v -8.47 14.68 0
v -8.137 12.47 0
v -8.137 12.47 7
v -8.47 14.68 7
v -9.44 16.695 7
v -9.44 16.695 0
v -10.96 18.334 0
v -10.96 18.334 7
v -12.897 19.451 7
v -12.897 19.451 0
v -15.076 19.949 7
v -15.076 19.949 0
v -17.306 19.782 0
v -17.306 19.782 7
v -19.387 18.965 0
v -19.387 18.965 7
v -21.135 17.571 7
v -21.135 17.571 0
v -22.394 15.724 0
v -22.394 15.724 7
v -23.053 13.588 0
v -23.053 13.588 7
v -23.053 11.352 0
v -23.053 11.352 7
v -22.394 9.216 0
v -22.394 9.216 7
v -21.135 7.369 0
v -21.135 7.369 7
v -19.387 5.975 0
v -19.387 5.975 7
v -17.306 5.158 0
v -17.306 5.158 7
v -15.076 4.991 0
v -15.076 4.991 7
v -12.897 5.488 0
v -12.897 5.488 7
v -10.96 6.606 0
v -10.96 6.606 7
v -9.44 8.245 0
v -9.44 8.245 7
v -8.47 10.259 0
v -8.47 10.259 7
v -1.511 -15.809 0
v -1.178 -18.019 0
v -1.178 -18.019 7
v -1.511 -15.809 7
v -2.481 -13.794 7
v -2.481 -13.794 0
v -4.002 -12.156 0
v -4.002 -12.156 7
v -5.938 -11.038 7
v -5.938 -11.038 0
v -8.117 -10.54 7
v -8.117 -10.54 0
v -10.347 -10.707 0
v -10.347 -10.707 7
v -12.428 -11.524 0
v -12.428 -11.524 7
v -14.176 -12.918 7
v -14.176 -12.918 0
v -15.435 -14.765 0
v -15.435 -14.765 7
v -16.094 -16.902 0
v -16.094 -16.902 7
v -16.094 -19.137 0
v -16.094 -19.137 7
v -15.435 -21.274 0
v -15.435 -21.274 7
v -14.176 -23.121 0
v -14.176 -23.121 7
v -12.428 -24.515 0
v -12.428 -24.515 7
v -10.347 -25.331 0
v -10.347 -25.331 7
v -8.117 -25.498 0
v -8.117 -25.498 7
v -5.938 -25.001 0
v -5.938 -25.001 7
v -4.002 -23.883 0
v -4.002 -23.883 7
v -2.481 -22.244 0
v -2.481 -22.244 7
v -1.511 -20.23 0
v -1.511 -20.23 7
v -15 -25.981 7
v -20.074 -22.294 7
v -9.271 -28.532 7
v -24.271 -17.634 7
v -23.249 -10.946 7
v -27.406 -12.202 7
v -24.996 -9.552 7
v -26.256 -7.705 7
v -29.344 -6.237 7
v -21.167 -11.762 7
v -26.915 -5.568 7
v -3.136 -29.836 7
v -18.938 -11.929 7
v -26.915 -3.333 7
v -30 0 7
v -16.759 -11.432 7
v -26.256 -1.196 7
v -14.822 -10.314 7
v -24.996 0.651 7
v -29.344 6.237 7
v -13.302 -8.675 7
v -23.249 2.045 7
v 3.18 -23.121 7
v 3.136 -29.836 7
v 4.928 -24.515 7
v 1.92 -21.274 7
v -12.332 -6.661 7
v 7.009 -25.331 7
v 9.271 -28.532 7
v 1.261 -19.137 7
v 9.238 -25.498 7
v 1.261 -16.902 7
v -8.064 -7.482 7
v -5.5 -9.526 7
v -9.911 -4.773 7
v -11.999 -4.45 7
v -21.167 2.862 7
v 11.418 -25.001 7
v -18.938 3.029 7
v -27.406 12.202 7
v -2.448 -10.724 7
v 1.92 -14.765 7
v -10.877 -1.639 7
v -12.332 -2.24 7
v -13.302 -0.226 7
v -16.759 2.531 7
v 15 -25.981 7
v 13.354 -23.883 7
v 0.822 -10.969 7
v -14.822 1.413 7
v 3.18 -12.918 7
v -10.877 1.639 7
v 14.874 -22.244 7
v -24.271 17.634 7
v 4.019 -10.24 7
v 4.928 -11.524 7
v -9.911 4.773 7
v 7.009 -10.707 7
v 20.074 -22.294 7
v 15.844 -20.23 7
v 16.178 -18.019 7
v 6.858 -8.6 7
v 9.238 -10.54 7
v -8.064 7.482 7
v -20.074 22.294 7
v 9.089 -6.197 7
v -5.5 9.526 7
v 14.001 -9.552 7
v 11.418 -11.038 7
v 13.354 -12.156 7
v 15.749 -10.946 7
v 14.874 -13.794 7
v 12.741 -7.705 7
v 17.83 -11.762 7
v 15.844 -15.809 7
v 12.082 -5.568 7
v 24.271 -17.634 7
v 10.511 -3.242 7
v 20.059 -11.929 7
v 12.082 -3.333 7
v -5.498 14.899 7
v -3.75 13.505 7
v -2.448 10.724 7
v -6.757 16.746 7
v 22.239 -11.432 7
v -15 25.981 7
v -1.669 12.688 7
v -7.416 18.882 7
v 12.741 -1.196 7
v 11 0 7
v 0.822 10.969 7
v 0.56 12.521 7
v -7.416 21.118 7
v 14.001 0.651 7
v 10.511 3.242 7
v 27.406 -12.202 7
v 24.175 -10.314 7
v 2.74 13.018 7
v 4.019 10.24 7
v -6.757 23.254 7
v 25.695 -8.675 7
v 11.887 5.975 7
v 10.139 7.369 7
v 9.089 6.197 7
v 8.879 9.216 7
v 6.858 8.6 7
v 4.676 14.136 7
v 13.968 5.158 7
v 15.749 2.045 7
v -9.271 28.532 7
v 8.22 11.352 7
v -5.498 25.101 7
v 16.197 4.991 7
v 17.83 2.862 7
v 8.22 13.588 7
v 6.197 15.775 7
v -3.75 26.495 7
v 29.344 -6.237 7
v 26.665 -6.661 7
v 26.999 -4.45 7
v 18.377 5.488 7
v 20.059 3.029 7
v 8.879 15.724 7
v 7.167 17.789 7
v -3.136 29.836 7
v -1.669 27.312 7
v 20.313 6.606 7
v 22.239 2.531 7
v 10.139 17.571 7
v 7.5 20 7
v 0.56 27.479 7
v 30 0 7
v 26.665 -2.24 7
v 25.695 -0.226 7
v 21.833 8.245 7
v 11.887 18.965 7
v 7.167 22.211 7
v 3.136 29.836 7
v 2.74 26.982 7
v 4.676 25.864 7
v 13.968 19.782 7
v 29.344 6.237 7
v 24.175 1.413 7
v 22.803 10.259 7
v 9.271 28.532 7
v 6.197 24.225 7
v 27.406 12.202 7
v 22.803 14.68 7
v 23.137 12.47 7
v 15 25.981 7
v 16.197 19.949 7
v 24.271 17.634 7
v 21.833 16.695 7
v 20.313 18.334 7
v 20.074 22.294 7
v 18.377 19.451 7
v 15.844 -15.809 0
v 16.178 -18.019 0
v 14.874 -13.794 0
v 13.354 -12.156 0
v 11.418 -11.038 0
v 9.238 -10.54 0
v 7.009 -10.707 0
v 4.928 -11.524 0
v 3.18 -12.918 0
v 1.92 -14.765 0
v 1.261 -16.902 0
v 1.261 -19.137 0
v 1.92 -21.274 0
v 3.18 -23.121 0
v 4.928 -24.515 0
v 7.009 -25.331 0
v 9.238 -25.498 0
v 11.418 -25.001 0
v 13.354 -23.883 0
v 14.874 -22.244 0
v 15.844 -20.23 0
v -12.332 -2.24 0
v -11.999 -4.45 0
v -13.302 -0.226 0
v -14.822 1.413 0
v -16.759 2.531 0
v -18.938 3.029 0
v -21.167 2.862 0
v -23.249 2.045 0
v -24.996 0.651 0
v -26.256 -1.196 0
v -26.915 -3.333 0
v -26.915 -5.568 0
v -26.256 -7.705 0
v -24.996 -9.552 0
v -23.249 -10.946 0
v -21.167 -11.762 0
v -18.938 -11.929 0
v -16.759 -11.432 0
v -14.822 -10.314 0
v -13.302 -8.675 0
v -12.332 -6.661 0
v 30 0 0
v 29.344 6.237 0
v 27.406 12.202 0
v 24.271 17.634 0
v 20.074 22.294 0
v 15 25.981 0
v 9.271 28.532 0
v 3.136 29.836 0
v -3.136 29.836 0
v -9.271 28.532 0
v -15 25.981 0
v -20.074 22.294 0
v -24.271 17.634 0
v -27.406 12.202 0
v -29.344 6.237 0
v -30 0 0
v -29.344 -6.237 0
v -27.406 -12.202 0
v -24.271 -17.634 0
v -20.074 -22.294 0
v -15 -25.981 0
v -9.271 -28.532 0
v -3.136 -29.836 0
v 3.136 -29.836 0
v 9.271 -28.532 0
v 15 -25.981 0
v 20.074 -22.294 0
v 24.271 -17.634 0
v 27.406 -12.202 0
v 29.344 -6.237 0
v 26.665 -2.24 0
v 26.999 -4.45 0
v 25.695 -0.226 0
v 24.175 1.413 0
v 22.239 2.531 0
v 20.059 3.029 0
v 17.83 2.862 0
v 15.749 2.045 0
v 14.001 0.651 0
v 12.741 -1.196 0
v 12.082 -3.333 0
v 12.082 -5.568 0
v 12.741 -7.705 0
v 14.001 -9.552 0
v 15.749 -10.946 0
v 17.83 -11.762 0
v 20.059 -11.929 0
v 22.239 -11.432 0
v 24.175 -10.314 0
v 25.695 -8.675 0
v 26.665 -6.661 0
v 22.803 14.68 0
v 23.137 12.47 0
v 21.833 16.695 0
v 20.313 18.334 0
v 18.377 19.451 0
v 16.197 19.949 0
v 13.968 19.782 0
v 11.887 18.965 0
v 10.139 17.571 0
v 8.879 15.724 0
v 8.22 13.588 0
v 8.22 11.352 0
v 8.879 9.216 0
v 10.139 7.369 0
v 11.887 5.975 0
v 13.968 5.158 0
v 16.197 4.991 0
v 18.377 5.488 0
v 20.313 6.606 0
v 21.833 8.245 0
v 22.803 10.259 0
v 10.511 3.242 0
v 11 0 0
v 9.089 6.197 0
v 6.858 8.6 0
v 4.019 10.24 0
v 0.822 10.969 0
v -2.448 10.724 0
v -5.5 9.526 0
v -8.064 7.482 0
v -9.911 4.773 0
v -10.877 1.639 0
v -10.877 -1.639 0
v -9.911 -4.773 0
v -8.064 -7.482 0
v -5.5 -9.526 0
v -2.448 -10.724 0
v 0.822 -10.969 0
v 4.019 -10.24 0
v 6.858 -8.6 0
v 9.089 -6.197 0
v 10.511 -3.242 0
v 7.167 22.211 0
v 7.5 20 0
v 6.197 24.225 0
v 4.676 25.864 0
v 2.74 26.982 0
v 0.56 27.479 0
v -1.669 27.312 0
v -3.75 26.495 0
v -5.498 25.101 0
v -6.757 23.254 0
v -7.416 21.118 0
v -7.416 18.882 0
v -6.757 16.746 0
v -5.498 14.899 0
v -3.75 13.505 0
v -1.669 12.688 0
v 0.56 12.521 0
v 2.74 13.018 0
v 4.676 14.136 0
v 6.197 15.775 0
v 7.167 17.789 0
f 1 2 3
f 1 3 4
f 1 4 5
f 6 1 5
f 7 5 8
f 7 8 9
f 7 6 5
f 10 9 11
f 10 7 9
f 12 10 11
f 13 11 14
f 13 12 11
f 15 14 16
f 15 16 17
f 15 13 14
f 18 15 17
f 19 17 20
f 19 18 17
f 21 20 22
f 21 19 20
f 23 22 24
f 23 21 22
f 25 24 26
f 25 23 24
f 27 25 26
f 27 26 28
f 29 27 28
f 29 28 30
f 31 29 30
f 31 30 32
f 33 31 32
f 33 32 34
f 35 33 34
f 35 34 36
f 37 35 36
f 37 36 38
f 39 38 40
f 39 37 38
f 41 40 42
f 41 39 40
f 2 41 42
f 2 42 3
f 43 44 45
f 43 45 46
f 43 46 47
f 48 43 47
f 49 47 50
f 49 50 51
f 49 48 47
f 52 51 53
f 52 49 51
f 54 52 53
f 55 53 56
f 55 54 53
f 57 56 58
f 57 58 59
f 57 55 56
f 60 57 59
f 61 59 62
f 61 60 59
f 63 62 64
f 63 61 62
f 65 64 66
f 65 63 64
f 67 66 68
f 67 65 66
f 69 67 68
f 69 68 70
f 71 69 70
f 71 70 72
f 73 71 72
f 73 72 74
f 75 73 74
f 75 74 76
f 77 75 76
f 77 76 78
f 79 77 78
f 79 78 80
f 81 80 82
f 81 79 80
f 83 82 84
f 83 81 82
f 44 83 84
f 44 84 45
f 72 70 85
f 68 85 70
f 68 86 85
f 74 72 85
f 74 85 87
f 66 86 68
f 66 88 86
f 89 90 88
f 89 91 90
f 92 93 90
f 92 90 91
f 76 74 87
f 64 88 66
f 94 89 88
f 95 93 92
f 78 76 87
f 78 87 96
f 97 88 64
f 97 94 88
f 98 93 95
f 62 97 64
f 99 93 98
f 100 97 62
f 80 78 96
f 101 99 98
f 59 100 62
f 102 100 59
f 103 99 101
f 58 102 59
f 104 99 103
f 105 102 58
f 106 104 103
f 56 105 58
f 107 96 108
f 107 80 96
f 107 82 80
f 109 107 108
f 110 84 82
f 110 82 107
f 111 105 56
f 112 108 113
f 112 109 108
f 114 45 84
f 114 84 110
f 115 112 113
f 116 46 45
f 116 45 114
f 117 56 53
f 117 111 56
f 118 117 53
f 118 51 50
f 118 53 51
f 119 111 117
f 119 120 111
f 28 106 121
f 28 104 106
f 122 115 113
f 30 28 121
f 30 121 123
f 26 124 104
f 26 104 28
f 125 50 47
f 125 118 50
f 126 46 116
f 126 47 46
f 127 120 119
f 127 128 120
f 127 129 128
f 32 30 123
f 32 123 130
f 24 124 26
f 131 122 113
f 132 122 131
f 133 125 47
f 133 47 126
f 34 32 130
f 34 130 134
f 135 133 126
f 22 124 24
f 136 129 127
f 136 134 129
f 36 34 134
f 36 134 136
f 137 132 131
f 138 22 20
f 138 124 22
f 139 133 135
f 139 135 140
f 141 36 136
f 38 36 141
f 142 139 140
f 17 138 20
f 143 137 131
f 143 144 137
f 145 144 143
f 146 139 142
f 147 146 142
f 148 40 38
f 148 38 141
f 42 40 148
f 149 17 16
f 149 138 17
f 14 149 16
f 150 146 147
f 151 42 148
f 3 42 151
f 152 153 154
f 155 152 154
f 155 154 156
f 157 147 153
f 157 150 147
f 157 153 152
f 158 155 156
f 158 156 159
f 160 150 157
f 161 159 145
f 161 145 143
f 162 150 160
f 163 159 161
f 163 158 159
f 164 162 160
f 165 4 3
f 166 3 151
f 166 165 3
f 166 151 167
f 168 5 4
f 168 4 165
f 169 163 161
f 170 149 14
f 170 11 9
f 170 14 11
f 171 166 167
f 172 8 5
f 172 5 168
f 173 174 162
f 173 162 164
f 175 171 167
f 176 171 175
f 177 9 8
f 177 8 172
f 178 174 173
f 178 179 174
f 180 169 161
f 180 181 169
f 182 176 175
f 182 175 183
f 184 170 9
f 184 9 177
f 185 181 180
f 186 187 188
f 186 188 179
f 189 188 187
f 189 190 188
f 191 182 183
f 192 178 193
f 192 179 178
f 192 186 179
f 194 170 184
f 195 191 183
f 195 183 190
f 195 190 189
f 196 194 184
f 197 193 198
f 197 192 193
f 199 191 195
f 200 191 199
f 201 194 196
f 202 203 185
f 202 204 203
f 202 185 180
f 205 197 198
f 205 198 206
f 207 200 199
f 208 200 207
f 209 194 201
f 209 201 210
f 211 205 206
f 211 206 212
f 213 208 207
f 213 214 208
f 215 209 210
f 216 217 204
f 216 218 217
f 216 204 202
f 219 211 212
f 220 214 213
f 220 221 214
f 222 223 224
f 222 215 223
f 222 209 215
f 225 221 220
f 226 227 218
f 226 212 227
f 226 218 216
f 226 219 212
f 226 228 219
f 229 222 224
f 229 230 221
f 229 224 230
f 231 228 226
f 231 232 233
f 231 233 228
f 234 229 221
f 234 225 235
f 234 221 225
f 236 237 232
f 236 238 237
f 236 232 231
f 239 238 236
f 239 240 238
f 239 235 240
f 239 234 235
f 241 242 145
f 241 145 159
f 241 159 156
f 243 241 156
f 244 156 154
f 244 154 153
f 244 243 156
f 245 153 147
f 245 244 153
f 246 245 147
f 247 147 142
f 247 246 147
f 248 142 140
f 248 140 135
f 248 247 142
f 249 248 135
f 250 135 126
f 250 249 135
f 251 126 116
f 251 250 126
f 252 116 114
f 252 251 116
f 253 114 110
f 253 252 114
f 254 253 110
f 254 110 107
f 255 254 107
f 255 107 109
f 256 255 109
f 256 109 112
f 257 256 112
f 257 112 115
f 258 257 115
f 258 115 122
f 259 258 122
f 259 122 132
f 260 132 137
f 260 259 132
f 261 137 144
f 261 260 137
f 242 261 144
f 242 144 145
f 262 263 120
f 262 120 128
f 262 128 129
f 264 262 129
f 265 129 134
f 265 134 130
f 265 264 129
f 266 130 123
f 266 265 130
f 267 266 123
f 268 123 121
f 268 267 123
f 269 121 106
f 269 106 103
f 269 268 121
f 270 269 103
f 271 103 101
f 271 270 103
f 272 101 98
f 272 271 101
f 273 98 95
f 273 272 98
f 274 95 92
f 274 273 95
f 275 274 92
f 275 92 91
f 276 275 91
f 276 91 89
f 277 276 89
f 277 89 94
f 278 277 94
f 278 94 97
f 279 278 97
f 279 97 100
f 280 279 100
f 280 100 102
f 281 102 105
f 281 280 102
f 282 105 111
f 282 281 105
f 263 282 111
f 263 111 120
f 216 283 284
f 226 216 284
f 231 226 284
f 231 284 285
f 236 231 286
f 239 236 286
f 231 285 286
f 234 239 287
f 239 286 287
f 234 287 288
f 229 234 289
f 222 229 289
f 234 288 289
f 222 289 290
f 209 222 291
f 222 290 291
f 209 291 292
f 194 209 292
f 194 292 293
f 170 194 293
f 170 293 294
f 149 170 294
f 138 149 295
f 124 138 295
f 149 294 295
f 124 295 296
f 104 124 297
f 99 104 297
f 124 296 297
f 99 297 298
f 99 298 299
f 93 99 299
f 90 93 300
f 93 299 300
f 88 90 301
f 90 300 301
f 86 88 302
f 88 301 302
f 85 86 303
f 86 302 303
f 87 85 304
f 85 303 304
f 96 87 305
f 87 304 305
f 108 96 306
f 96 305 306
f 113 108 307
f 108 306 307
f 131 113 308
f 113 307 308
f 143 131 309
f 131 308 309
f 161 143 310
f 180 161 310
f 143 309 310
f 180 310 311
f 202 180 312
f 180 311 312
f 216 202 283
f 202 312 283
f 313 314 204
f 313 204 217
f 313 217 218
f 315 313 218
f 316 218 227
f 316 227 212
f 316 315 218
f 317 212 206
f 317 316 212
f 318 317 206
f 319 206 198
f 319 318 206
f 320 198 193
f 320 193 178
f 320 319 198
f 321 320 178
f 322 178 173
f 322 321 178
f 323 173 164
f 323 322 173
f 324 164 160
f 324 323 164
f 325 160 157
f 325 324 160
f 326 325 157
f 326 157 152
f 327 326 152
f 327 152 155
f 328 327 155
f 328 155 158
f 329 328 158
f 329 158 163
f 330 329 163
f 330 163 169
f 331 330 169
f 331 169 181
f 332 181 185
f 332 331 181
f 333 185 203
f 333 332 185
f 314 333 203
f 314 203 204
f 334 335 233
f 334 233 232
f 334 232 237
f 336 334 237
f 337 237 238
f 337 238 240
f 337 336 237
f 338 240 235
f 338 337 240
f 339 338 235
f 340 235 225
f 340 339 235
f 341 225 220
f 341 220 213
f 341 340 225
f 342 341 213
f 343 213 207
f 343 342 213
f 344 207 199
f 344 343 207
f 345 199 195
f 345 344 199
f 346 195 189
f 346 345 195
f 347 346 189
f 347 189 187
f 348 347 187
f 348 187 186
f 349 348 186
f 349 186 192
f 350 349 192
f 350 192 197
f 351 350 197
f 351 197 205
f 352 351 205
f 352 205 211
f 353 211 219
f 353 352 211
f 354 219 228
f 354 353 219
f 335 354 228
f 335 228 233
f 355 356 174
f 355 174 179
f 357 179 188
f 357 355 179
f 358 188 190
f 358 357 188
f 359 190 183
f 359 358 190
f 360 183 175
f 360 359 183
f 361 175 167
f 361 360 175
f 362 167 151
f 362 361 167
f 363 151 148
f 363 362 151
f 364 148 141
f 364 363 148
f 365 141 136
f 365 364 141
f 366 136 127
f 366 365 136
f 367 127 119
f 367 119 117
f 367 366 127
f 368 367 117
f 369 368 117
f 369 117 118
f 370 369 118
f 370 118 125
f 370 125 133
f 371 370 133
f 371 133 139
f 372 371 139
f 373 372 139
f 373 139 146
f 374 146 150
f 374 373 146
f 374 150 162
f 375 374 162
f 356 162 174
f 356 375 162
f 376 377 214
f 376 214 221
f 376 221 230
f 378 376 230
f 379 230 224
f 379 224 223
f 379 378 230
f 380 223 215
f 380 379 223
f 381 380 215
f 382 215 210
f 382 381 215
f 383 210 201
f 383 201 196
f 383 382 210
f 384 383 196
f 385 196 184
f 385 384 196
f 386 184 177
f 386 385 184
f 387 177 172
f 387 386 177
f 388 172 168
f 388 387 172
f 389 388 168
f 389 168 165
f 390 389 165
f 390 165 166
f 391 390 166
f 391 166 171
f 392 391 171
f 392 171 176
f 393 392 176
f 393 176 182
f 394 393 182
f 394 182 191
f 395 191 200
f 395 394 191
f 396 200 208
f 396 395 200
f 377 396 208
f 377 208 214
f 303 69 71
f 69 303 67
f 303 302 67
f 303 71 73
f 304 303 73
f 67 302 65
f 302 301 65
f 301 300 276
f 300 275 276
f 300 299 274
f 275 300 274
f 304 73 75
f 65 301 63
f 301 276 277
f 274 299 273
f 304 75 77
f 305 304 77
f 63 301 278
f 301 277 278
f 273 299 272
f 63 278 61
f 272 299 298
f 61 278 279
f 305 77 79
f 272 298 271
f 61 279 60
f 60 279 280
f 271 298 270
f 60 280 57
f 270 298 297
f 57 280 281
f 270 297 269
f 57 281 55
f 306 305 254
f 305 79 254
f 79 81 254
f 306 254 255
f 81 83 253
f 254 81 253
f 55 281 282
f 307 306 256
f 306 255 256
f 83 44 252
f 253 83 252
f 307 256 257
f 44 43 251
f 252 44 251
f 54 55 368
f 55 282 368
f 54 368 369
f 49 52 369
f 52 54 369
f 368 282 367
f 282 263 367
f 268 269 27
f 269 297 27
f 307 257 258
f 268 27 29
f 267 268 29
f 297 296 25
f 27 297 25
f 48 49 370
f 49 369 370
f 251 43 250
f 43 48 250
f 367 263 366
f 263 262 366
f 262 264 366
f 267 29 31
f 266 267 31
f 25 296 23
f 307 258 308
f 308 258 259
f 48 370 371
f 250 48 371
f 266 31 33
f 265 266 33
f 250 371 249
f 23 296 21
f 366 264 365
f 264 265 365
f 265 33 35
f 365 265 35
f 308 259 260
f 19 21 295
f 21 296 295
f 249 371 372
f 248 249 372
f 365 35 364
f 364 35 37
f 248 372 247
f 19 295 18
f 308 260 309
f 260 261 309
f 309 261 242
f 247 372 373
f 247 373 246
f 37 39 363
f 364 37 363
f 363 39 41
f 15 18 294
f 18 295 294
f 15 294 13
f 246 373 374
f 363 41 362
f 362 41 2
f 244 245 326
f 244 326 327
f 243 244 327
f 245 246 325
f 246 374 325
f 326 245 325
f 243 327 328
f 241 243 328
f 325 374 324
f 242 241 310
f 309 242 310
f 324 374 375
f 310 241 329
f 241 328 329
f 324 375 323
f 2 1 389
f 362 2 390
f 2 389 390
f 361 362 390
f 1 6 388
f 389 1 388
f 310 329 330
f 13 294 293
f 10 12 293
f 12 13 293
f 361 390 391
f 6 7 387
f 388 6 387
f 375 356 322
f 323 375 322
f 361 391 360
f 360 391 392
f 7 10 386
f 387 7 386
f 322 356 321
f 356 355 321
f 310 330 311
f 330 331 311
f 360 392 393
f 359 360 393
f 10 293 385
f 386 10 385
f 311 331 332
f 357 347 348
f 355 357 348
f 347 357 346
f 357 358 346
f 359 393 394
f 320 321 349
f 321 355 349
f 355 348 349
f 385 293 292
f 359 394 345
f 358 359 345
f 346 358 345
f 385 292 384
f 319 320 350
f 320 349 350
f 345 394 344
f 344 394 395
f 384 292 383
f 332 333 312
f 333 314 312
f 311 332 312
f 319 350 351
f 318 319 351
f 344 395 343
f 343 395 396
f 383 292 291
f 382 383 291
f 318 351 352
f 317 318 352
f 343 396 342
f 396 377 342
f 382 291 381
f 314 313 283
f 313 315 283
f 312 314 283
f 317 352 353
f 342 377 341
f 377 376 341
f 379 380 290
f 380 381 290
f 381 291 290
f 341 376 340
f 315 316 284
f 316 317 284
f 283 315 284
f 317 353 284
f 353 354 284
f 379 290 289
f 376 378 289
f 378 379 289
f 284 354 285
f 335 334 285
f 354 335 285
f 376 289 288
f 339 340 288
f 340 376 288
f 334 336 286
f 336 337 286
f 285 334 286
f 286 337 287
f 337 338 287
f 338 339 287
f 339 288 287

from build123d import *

# Parameters (mm, degrees)
F0_R     = 30
F0_R_2   = 7.5
F0_R_3   = 11
F1_DEPTH = 7


with BuildPart() as f1:
    # F0 (on Top) → F1 (new body)
    with BuildSketch(Plane.XY):
        Circle(F0_R)
        with Locations((-8.677675, -18.019377)):
            Circle(F0_R_2, mode=Mode.SUBTRACT)
        with Locations((-19.498558, -4.450419)):
            Circle(F0_R_2, mode=Mode.SUBTRACT)
        with Locations((8.677675, -18.019377)):
            Circle(F0_R_2, mode=Mode.SUBTRACT)
        with Locations((19.498558, -4.450419)):
            Circle(F0_R_2, mode=Mode.SUBTRACT)
        with Locations((-15.63663, 12.469796)):
            Circle(F0_R_2, mode=Mode.SUBTRACT)
        Circle(F0_R_3, mode=Mode.SUBTRACT)
        with Locations((15.63663, 12.469796)):
            Circle(F0_R_2, mode=Mode.SUBTRACT)
        with Locations((0, 20)):
            Circle(F0_R_2, mode=Mode.SUBTRACT)
    extrude(amount=F1_DEPTH)


solid = f1.part
